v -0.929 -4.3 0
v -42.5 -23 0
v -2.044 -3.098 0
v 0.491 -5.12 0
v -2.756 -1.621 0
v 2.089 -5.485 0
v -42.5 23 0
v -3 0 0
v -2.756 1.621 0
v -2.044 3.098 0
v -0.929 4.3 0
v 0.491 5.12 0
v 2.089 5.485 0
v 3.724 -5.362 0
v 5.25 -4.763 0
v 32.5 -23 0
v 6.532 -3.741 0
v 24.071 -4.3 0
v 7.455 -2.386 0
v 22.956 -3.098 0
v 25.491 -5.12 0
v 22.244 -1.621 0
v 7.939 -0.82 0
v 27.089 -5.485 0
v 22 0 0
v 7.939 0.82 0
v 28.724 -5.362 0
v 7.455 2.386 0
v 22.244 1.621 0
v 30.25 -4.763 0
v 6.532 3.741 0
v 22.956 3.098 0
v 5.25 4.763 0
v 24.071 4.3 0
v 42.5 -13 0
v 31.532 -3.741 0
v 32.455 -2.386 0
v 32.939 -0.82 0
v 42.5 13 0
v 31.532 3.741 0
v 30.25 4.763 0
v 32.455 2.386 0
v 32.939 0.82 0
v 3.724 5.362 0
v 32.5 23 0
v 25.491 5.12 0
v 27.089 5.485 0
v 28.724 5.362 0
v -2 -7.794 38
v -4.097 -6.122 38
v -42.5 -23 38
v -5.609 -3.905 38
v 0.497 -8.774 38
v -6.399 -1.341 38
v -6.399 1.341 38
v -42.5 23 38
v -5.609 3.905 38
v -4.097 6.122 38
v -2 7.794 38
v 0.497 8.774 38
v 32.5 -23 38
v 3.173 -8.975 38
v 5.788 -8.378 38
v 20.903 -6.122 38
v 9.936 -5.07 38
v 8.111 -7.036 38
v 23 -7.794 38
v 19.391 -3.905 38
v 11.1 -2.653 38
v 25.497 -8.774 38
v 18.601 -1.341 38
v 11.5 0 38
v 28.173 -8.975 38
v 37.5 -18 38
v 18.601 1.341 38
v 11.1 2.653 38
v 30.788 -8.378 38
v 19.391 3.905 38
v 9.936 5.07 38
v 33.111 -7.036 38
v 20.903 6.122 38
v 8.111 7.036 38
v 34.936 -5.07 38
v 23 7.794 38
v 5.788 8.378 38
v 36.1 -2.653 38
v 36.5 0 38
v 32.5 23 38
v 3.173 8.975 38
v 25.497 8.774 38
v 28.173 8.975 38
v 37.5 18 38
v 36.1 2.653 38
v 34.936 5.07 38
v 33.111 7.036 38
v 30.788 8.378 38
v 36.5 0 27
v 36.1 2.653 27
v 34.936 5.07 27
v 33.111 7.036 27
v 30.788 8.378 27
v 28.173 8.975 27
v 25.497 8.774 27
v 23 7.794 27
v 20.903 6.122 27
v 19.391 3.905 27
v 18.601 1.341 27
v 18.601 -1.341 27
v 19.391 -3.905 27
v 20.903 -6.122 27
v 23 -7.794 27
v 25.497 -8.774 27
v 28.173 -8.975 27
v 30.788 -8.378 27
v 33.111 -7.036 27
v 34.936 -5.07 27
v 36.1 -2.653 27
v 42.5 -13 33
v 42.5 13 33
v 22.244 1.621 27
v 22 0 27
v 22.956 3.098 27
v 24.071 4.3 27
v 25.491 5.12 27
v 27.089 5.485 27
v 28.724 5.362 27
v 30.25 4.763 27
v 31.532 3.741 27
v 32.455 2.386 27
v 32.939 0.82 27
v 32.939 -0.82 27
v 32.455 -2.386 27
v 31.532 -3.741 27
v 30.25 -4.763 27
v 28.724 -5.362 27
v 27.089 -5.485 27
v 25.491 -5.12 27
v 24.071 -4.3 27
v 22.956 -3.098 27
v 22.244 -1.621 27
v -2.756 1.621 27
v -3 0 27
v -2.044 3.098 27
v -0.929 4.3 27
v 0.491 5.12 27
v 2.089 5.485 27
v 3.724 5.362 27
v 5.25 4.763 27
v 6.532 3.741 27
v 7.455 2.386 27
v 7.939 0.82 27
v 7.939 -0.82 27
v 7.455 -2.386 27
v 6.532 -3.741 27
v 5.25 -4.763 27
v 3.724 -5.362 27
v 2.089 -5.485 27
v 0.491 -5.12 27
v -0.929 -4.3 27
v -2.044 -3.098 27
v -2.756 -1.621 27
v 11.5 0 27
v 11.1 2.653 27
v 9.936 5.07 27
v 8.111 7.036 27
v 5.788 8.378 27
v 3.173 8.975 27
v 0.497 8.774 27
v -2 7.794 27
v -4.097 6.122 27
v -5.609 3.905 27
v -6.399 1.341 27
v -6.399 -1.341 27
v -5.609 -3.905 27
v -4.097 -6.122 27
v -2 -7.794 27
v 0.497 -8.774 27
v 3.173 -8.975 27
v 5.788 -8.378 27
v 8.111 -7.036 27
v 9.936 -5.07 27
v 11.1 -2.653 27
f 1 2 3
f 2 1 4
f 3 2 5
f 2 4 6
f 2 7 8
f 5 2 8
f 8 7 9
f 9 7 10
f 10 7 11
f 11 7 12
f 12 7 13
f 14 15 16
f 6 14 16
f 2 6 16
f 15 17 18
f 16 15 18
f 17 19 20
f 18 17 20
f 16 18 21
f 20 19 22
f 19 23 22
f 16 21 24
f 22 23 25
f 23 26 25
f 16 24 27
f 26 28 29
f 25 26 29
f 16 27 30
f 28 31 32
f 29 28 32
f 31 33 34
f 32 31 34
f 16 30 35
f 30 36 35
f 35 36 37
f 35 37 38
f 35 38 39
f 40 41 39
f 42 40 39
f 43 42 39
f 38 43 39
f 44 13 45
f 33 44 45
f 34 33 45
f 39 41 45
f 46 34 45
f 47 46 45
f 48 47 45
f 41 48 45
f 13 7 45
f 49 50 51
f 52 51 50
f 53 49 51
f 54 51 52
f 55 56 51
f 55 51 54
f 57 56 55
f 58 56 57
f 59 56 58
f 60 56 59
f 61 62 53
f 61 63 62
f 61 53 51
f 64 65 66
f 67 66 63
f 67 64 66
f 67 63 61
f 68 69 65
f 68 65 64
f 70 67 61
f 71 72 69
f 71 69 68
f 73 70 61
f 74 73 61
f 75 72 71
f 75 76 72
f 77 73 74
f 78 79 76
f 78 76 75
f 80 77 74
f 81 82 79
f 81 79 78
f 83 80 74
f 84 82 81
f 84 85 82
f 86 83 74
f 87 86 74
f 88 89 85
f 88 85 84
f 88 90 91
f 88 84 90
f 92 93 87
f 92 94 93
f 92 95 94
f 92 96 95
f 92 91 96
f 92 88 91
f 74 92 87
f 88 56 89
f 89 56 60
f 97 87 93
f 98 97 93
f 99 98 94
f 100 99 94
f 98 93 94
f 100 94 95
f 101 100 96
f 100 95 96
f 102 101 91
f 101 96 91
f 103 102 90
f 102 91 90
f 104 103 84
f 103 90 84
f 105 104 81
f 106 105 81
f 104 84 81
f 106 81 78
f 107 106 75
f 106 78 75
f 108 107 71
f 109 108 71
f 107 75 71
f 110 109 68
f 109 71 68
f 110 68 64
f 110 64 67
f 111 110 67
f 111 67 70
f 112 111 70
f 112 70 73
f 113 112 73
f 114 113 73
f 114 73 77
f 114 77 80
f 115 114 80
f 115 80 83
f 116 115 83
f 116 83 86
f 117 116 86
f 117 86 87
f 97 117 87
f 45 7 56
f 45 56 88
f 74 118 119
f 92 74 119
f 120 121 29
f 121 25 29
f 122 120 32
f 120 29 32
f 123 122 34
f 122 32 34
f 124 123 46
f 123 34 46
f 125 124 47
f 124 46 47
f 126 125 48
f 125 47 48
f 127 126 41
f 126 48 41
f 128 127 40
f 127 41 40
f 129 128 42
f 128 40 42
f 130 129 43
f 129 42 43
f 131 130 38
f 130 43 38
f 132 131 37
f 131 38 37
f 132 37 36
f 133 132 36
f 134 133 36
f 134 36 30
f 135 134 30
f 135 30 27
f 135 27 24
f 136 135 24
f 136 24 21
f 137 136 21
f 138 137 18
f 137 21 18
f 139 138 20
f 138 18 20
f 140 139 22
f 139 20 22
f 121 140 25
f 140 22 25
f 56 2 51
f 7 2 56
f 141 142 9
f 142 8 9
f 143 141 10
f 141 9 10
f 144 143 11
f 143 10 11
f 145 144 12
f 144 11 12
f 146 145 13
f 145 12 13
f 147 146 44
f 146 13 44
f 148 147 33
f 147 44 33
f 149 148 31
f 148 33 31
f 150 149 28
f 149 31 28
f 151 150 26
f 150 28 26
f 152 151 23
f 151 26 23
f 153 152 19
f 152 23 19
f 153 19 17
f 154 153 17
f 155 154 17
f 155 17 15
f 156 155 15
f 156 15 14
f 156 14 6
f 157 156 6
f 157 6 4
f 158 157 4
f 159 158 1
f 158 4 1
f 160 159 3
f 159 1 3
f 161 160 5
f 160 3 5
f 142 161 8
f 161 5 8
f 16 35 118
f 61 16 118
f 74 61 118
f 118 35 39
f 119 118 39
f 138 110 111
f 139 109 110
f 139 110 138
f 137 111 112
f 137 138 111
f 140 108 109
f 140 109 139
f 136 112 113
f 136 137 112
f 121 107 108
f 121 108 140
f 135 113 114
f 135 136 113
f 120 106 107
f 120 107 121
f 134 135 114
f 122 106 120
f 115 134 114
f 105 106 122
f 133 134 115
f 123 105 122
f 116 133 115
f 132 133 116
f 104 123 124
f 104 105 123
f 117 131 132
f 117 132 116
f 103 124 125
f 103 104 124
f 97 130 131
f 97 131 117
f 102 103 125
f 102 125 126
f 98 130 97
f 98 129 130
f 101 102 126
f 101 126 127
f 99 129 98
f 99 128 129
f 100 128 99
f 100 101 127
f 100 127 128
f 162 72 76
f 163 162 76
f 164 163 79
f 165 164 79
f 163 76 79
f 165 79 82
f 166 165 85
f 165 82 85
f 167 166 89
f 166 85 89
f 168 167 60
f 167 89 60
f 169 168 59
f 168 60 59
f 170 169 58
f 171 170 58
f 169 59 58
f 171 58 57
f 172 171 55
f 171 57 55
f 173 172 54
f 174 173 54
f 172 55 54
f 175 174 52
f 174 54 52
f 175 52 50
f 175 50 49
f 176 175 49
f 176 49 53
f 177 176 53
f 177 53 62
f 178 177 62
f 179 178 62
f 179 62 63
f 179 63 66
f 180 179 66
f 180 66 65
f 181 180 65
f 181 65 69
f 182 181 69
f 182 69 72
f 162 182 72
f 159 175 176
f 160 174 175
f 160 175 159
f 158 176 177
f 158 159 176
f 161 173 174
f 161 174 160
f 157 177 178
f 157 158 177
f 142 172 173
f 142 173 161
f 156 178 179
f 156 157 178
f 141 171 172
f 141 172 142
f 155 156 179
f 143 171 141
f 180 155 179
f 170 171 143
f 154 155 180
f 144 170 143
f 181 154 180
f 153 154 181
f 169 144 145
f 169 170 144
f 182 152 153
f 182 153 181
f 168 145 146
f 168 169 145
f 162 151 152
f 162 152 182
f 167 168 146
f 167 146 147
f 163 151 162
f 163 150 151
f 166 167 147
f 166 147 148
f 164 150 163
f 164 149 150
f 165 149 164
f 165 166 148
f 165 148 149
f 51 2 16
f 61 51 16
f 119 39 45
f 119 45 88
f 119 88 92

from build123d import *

# Parameters (mm, degrees)
SKETCH_1_W                = 85
SKETCH_1_H                = 46
EXTRUDE_1_DEPTH           = 38
HOLE_WIZARD_1_D           = 11
HOLE_WIZARD_1_CBORE_D     = 18
HOLE_WIZARD_1_CBORE_DEPTH = 11
CHAMFER_1_SIZE            = 10
CHAMFER_2_SIZE            = 5


with BuildPart() as part:
    # 草图1 → 凸台-拉伸1 (new body)
    with BuildSketch(Plane.XY):
        Rectangle(SKETCH_1_W, SKETCH_1_H)
    extrude(amount=EXTRUDE_1_DEPTH)

    # 打孔尺寸(%根据)内六角圆柱头螺钉的类型1 (through all)
    with Locations(Plane.XY.offset(38)):
        with Locations((2.5, 0), (27.5, 0)):
            CounterBoreHole(HOLE_WIZARD_1_D / 2, HOLE_WIZARD_1_CBORE_D / 2, HOLE_WIZARD_1_CBORE_DEPTH)

    # 倒角1
    chamfer_1_edges = [part.edges().sort_by_distance(p)[0] for p in [
        (42.5, 23, 19),
        (42.5, -23, 19),
    ]]
    chamfer(chamfer_1_edges, length=CHAMFER_1_SIZE)

    # 倒角2
    chamfer_2_edges = [part.edges().sort_by_distance(p)[0] for p in [
        (42.5, 0, 38),
    ]]
    chamfer(chamfer_2_edges, length=CHAMFER_2_SIZE)


solid = part.part
